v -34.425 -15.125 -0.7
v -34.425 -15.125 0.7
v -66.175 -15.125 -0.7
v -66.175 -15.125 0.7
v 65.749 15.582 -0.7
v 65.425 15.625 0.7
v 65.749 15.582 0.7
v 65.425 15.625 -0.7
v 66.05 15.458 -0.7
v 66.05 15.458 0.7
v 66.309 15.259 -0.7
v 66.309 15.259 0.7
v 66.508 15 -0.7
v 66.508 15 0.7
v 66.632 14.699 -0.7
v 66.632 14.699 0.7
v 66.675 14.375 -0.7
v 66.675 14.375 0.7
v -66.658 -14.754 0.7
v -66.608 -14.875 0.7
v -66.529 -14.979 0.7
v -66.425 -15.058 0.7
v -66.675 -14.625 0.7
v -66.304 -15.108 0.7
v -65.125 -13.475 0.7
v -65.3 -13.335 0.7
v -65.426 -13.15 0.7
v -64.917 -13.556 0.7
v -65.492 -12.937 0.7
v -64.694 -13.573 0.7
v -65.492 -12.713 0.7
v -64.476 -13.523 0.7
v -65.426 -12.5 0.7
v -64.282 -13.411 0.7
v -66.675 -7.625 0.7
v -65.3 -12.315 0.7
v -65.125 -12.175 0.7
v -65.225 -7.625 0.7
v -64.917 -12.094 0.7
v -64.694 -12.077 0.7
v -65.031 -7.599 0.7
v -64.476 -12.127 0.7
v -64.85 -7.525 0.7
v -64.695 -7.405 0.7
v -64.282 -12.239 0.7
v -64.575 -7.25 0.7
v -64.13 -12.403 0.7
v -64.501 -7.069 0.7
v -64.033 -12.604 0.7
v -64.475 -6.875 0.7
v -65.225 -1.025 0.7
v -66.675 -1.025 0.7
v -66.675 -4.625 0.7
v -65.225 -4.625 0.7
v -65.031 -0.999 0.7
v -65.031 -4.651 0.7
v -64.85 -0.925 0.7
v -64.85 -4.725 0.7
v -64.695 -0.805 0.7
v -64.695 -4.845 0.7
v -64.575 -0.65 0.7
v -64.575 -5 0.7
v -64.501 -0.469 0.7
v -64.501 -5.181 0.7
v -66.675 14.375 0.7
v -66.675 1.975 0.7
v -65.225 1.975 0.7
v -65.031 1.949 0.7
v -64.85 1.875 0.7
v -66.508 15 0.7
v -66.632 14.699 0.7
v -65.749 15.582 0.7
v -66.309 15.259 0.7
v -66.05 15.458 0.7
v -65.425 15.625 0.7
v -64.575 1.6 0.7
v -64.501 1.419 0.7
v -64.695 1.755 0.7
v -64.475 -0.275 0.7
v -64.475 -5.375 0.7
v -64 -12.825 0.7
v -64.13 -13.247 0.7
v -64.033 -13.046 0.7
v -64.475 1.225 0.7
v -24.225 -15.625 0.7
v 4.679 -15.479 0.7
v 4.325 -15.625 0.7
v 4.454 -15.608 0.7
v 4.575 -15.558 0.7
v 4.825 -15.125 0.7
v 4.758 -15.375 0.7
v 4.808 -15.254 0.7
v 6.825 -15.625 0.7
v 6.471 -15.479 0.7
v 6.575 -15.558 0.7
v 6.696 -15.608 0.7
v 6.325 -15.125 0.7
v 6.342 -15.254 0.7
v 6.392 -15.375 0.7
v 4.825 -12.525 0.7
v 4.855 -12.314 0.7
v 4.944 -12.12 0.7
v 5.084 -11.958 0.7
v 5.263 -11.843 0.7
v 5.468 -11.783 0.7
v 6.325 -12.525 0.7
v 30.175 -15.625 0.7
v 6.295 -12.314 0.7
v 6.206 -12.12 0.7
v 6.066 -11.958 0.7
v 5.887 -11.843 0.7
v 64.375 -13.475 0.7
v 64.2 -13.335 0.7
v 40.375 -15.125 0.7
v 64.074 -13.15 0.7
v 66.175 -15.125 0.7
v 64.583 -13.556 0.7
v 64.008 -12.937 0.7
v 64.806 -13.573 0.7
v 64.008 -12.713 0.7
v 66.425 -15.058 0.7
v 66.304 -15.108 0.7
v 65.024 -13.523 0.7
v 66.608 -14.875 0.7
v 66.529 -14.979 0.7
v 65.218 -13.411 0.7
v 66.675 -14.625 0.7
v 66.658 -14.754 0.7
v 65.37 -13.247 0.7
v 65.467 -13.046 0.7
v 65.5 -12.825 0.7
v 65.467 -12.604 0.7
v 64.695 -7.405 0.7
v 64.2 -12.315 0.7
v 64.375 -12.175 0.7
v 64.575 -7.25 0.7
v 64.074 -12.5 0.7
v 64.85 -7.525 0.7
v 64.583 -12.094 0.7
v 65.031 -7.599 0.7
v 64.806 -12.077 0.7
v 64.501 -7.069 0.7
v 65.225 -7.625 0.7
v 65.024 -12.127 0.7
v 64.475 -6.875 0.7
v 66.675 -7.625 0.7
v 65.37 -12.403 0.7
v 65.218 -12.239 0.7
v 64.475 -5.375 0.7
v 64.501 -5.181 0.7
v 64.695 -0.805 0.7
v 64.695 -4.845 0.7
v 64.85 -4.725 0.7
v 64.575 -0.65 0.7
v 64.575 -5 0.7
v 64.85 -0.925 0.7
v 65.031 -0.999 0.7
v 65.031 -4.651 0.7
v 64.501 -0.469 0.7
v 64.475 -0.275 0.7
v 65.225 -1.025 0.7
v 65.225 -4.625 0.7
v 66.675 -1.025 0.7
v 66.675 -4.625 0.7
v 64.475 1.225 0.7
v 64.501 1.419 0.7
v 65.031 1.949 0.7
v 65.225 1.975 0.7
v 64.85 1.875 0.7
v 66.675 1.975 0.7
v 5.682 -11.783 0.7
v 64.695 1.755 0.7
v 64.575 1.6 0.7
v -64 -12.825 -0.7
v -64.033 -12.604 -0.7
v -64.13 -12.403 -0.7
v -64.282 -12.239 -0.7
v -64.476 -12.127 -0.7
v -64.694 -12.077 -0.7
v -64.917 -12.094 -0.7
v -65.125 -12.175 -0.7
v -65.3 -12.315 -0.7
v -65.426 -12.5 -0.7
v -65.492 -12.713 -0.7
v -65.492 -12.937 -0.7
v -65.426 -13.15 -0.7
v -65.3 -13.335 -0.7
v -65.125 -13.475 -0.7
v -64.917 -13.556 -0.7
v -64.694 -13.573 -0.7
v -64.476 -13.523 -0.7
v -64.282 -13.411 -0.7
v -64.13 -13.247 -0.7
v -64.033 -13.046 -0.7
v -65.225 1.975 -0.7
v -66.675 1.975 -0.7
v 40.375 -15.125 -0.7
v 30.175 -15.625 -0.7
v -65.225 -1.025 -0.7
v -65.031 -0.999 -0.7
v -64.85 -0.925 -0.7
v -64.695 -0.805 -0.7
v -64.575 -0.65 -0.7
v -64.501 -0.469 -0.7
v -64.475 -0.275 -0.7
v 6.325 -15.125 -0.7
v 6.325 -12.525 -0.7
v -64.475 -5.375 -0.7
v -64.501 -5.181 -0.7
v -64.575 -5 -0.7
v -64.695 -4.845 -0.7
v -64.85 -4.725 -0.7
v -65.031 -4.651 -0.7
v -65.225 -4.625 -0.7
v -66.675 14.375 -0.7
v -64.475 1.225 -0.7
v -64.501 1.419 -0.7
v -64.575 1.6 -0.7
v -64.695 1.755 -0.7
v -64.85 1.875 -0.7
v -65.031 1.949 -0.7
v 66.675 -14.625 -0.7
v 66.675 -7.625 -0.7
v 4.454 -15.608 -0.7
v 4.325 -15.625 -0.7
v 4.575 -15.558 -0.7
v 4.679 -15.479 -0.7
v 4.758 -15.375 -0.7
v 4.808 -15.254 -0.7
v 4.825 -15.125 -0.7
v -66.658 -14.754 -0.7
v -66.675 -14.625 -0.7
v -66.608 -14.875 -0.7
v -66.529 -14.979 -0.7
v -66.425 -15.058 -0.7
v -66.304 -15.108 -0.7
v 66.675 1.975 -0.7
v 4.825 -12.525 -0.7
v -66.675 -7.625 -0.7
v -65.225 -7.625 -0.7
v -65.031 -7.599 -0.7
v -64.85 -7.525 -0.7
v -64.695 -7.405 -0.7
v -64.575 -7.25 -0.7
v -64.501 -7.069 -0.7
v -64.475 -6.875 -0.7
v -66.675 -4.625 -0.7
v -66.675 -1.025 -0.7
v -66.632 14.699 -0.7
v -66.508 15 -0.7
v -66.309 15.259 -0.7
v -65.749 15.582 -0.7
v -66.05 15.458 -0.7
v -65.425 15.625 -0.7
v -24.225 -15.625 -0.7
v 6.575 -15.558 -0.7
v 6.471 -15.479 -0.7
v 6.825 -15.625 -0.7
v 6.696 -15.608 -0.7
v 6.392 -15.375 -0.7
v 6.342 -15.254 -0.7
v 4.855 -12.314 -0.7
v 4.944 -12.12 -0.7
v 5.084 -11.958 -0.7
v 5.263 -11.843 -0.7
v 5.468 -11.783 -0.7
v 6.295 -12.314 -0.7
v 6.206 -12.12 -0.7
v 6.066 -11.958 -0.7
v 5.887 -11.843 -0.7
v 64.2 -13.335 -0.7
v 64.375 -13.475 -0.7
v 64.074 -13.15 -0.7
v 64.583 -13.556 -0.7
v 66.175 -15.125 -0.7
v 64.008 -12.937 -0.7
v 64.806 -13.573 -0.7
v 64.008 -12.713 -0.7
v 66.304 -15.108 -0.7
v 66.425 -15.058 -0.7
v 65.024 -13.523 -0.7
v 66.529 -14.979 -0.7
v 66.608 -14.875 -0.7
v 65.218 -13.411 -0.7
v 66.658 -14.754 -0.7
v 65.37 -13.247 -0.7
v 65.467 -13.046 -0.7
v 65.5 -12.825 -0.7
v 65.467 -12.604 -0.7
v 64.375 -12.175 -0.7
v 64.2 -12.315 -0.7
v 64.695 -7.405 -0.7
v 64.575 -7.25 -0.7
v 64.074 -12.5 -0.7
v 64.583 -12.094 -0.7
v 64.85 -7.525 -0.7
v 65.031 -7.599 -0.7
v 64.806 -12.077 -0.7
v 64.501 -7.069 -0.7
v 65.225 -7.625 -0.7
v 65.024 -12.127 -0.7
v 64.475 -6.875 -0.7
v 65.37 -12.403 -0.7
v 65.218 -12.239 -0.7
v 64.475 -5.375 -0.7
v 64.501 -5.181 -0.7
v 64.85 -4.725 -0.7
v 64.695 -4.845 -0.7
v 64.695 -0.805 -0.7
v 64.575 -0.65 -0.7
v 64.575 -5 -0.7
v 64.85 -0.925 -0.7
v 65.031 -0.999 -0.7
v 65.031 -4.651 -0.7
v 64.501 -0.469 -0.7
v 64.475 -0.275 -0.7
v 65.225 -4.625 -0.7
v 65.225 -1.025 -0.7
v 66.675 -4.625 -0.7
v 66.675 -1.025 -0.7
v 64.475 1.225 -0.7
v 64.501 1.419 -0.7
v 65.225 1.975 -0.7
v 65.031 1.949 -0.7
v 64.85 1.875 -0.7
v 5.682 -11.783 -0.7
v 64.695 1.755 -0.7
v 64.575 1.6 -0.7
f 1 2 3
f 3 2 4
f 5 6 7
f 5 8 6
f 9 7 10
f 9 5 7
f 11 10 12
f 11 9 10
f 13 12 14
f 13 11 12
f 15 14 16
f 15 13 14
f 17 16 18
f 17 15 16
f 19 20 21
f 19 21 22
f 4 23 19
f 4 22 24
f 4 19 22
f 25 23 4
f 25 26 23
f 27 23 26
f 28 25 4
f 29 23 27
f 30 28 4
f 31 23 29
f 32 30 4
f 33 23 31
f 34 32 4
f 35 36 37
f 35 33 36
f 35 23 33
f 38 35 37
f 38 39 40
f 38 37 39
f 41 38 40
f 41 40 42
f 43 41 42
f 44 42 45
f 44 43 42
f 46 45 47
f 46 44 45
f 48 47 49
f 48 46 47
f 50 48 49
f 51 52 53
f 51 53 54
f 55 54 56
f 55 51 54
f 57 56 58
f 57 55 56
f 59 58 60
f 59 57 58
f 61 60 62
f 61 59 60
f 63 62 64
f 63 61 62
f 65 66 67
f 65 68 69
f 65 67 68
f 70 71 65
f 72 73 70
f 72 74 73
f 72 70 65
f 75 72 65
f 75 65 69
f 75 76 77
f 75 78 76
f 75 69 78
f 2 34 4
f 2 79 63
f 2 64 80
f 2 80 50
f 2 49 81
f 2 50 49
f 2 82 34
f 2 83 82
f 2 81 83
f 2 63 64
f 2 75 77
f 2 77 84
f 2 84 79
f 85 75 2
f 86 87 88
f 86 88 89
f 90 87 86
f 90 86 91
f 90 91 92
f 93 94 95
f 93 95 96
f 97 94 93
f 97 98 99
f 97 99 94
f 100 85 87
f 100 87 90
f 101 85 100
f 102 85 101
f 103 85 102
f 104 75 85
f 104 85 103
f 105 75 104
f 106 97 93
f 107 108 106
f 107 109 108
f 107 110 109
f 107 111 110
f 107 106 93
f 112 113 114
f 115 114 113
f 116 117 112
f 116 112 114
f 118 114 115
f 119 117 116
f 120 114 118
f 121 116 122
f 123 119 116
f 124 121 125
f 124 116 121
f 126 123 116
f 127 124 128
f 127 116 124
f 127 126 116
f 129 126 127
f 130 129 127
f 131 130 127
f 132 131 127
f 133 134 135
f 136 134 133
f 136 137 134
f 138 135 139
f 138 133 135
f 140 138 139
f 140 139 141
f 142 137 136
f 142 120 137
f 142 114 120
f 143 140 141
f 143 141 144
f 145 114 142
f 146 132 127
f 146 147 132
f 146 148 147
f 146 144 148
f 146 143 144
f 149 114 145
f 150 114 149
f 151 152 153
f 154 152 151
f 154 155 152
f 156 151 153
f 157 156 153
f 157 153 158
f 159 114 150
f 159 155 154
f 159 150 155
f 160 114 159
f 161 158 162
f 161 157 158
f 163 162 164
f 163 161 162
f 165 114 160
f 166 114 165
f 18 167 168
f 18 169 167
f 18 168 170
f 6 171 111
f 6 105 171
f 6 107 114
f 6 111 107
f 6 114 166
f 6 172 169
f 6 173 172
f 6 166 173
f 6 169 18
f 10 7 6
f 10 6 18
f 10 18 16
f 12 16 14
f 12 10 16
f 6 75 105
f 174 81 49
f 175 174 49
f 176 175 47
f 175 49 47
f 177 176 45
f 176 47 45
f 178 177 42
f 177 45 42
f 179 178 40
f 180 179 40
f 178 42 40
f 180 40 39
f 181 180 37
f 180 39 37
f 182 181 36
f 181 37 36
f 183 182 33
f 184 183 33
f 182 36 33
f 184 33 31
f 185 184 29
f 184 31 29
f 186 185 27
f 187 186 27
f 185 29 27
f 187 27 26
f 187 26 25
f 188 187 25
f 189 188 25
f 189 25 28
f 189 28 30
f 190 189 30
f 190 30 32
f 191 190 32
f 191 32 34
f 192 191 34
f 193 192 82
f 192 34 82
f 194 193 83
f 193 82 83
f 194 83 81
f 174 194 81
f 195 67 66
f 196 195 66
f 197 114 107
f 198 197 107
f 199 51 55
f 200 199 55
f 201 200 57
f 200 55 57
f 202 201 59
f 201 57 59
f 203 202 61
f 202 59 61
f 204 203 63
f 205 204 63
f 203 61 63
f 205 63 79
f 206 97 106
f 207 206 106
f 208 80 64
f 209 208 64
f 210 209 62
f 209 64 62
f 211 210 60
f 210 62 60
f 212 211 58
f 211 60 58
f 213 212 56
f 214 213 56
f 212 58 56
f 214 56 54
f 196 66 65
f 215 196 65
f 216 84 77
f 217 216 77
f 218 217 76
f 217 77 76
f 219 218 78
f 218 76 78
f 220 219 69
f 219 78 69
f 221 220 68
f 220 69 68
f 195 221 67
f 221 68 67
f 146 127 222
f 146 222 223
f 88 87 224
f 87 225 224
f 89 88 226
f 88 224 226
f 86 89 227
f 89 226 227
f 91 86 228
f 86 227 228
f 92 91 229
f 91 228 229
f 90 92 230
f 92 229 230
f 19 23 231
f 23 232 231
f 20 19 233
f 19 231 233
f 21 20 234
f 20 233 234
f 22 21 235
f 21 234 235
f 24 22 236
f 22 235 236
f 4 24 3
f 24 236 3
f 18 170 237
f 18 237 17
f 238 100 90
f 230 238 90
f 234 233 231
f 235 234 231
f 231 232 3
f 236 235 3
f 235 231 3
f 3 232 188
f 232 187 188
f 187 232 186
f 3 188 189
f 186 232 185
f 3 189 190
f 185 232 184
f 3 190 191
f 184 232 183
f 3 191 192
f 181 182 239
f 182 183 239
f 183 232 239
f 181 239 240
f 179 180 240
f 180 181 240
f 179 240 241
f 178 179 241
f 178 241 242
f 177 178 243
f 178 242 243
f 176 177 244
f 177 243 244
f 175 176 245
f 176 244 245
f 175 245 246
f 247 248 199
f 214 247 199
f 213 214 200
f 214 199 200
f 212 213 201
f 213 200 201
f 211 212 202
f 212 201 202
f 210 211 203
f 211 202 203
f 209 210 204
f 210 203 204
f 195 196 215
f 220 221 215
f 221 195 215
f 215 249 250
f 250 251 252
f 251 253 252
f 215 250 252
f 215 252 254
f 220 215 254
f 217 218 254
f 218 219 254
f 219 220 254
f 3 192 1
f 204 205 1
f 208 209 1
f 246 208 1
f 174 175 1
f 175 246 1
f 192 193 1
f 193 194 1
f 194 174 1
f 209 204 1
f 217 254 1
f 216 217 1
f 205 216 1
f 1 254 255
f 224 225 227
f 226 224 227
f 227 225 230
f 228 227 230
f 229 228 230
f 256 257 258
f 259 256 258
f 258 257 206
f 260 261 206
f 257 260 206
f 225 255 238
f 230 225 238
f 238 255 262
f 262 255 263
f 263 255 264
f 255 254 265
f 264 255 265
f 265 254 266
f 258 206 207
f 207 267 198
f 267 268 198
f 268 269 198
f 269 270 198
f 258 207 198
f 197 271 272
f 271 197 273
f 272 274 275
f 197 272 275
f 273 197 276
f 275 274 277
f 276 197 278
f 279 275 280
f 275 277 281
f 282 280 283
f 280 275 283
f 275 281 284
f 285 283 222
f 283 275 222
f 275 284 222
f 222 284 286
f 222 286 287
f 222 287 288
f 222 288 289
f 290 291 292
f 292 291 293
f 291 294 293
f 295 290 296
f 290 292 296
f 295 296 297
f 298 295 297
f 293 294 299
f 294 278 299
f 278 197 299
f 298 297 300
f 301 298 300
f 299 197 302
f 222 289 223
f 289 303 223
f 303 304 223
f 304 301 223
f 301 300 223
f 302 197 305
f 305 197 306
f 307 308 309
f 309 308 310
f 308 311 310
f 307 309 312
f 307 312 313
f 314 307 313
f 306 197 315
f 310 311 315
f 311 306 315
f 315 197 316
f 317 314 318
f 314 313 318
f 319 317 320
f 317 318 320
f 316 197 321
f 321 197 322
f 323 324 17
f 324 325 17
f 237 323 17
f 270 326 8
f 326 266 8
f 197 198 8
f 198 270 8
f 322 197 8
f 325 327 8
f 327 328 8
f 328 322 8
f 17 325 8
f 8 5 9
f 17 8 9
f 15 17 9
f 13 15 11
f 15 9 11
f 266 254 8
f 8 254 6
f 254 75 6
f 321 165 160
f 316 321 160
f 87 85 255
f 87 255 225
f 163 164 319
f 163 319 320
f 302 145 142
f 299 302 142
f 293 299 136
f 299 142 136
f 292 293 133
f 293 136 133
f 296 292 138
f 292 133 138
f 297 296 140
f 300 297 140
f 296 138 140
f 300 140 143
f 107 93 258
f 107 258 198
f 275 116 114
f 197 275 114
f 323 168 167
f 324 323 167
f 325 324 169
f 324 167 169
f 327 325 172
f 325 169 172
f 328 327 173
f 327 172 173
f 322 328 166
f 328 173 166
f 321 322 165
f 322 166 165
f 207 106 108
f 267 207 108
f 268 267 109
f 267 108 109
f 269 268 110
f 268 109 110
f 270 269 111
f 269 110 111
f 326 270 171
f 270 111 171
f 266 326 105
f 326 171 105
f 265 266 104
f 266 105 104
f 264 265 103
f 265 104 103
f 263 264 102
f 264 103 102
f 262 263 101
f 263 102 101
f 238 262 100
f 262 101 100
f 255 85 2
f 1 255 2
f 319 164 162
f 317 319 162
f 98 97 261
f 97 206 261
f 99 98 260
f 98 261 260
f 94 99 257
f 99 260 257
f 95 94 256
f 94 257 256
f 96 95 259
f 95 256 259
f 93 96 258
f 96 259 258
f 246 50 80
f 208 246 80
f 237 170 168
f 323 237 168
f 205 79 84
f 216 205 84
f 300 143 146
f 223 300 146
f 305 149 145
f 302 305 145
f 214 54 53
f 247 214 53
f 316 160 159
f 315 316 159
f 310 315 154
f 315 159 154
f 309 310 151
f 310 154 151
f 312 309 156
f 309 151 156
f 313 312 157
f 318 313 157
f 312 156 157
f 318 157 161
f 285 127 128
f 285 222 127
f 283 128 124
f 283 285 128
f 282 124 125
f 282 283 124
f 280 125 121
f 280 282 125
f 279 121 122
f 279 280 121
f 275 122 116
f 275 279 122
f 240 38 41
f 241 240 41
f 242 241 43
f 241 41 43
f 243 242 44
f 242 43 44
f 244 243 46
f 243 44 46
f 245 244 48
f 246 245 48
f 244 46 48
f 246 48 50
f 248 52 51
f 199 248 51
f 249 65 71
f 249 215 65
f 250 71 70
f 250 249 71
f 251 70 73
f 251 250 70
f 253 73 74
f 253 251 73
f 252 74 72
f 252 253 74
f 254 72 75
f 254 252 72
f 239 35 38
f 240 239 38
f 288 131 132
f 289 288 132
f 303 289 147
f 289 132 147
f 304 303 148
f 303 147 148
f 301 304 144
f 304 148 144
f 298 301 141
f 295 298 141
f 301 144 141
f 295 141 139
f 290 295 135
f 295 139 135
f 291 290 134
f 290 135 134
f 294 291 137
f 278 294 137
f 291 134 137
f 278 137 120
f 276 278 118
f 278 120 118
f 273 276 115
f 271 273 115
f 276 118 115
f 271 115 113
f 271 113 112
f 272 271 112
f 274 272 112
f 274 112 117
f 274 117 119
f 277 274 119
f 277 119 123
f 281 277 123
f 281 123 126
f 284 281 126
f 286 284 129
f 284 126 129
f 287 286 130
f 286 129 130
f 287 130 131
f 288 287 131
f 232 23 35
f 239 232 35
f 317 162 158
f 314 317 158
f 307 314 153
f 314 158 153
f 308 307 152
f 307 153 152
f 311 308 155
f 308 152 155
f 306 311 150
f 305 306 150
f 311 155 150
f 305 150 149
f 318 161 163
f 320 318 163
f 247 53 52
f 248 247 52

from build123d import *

# Parameters (mm, degrees)
SKETCH1_W           = 133.35
SKETCH1_H           = 31.25
BOSS_EXTRUDE1_DEPTH = 0.7
SKETCH2_R           = 0.75
CUT_EXTRUDE1_DEPTH  = 1.4
FILLET1_R           = 1.25
FILLET2_R           = 0.5


with BuildPart() as part:
    # Sketch1 → Boss-Extrude1 (new body, symmetric)
    with BuildSketch(Plane.XY):
        Rectangle(SKETCH1_W, SKETCH1_H)
    extrude(amount=BOSS_EXTRUDE1_DEPTH, both=True)

    # Sketch2 → Cut-Extrude1 (cut)
    with BuildSketch(Plane.XY.offset(0.7)):
        Polygon((66.675, -15.625), (66.675, -15.125), (40.375, -15.125), (30.175, -15.625), align=None)
        Polygon((-34.425, -15.125), (-66.675, -15.125), (-66.675, -15.625), (-24.225, -15.625), align=None)
        with BuildLine():
            Line((-65.225, 1.975), (-66.675, 1.975))
            Line((-66.675, 1.975), (-66.675, -1.025))
            Line((-66.675, -1.025), (-65.225, -1.025))
            ThreePointArc((-65.225, -1.025), (-64.694669914, -0.805330086), (-64.475, -0.275))
            Line((-64.475, -0.275), (-64.475, 1.225))
            ThreePointArc((-64.475, 1.225), (-64.694669914, 1.755330086), (-65.225, 1.975))
        make_face()
        with BuildLine():
            Line((-65.225, -4.625), (-66.675, -4.625))
            Line((-66.675, -4.625), (-66.675, -7.625))
            Line((-66.675, -7.625), (-65.225, -7.625))
            ThreePointArc((-65.225, -7.625), (-64.694669914, -7.405330086), (-64.475, -6.875))
            Line((-64.475, -6.875), (-64.475, -5.375))
            ThreePointArc((-64.475, -5.375), (-64.694669914, -4.844669914), (-65.225, -4.625))
        make_face()
        with BuildLine():
            Line((66.675, -1.025), (66.675, 1.975))
            Line((66.675, 1.975), (65.225, 1.975))
            ThreePointArc((65.225, 1.975), (64.694669914, 1.755330086), (64.475, 1.225))
            Line((64.475, 1.225), (64.475, -0.275))
            ThreePointArc((64.475, -0.275), (64.694669914, -0.805330086), (65.225, -1.025))
            Line((65.225, -1.025), (66.675, -1.025))
        make_face()
        with BuildLine():
            Line((66.675, -7.625), (66.675, -4.625))
            Line((66.675, -4.625), (65.225, -4.625))
            ThreePointArc((65.225, -4.625), (64.694669914, -4.844669914), (64.475, -5.375))
            Line((64.475, -5.375), (64.475, -6.875))
            ThreePointArc((64.475, -6.875), (64.694669914, -7.405330086), (65.225, -7.625))
            Line((65.225, -7.625), (66.675, -7.625))
        make_face()
        with BuildLine():
            Line((4.825, -15.625), (6.325, -15.625))
            Line((6.325, -15.625), (6.325, -12.525))
            ThreePointArc((6.325, -12.525), (5.575, -11.775), (4.825, -12.525))
            Line((4.825, -12.525), (4.825, -15.625))
        make_face()
        with Locations((-64.75, -12.825)):
            Circle(SKETCH2_R)
        with Locations((64.75, -12.825)):
            Circle(SKETCH2_R)
    extrude(amount=-CUT_EXTRUDE1_DEPTH, mode=Mode.SUBTRACT)

    # Fillet1
    fillet1_edges = [part.edges().sort_by_distance(p)[0] for p in [
        (-66.675, 15.625, 0),
        (66.675, 15.625, 0),
    ]]
    fillet(fillet1_edges, radius=FILLET1_R)

    # Fillet2
    fillet2_edges = [part.edges().sort_by_distance(p)[0] for p in [
        (6.325, -15.625, 0),
        (4.825, -15.625, 0),
        (40.375, -15.125, 0),
        (66.675, -15.125, 0),
        (30.175, -15.625, 0),
        (-34.425, -15.125, 0),
        (-24.225, -15.625, 0),
        (-66.675, -15.125, 0),
    ]]
    fillet(fillet2_edges, radius=FILLET2_R)


solid = part.part
